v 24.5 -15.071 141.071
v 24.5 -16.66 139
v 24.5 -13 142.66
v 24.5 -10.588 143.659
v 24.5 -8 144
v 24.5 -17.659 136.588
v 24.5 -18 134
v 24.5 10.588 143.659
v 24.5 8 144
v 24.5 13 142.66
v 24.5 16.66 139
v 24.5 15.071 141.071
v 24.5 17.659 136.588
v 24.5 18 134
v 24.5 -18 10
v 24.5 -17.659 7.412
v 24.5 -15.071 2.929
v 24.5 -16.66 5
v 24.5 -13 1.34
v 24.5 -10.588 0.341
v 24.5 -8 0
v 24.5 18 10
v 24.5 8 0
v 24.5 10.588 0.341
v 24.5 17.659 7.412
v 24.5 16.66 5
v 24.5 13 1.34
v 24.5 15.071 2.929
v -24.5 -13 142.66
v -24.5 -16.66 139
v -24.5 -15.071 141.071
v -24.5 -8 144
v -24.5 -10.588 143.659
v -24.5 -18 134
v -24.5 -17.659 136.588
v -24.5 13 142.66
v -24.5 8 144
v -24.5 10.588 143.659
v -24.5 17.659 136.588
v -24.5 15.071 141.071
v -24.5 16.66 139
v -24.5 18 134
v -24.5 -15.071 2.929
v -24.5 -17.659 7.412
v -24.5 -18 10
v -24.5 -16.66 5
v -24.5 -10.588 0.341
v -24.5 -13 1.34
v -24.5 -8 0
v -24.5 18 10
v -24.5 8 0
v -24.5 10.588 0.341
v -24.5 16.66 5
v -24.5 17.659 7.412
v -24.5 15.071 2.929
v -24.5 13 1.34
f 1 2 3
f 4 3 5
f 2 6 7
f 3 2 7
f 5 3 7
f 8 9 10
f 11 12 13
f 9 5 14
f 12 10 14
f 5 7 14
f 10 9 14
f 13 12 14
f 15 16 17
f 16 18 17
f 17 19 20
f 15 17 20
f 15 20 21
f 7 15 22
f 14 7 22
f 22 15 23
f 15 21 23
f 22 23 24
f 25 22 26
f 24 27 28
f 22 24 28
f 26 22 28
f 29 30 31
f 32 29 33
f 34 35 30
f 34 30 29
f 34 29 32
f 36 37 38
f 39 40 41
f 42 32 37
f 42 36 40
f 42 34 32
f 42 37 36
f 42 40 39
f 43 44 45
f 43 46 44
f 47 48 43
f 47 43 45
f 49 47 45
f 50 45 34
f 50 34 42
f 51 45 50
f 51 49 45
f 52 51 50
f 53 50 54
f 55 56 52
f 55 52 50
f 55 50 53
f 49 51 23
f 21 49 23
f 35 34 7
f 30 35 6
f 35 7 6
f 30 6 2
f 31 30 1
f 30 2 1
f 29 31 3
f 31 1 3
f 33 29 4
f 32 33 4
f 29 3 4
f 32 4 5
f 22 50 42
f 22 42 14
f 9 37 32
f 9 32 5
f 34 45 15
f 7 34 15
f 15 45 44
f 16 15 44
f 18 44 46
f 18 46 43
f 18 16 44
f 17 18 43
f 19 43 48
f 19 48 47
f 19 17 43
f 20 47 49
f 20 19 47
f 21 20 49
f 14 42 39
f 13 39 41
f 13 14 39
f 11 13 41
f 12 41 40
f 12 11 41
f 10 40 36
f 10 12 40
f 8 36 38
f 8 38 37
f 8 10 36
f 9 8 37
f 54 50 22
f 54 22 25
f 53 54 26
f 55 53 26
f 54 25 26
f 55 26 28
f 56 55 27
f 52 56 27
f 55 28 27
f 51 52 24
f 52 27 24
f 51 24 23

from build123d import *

# Parameters (mm, degrees)
SCHIZZO1_W                   = 49
SCHIZZO1_H                   = 36
ESTRUSIONE_ESTRUSIONE1_DEPTH = 144
RACCORDO1_R                  = 10


with BuildPart() as part:
    # Schizzo1 → Estrusione-Estrusione1 (new body)
    with BuildSketch(Plane.XY):
        Rectangle(SCHIZZO1_W, SCHIZZO1_H)
    extrude(amount=ESTRUSIONE_ESTRUSIONE1_DEPTH)

    # Raccordo1
    raccordo1_edges = [part.edges().sort_by_distance(p)[0] for p in [
        (0, -18, 144),
        (0, -18, 0),
        (0, 18, 0),
        (0, 18, 144),
    ]]
    fillet(raccordo1_edges, radius=RACCORDO1_R)


solid = part.part
